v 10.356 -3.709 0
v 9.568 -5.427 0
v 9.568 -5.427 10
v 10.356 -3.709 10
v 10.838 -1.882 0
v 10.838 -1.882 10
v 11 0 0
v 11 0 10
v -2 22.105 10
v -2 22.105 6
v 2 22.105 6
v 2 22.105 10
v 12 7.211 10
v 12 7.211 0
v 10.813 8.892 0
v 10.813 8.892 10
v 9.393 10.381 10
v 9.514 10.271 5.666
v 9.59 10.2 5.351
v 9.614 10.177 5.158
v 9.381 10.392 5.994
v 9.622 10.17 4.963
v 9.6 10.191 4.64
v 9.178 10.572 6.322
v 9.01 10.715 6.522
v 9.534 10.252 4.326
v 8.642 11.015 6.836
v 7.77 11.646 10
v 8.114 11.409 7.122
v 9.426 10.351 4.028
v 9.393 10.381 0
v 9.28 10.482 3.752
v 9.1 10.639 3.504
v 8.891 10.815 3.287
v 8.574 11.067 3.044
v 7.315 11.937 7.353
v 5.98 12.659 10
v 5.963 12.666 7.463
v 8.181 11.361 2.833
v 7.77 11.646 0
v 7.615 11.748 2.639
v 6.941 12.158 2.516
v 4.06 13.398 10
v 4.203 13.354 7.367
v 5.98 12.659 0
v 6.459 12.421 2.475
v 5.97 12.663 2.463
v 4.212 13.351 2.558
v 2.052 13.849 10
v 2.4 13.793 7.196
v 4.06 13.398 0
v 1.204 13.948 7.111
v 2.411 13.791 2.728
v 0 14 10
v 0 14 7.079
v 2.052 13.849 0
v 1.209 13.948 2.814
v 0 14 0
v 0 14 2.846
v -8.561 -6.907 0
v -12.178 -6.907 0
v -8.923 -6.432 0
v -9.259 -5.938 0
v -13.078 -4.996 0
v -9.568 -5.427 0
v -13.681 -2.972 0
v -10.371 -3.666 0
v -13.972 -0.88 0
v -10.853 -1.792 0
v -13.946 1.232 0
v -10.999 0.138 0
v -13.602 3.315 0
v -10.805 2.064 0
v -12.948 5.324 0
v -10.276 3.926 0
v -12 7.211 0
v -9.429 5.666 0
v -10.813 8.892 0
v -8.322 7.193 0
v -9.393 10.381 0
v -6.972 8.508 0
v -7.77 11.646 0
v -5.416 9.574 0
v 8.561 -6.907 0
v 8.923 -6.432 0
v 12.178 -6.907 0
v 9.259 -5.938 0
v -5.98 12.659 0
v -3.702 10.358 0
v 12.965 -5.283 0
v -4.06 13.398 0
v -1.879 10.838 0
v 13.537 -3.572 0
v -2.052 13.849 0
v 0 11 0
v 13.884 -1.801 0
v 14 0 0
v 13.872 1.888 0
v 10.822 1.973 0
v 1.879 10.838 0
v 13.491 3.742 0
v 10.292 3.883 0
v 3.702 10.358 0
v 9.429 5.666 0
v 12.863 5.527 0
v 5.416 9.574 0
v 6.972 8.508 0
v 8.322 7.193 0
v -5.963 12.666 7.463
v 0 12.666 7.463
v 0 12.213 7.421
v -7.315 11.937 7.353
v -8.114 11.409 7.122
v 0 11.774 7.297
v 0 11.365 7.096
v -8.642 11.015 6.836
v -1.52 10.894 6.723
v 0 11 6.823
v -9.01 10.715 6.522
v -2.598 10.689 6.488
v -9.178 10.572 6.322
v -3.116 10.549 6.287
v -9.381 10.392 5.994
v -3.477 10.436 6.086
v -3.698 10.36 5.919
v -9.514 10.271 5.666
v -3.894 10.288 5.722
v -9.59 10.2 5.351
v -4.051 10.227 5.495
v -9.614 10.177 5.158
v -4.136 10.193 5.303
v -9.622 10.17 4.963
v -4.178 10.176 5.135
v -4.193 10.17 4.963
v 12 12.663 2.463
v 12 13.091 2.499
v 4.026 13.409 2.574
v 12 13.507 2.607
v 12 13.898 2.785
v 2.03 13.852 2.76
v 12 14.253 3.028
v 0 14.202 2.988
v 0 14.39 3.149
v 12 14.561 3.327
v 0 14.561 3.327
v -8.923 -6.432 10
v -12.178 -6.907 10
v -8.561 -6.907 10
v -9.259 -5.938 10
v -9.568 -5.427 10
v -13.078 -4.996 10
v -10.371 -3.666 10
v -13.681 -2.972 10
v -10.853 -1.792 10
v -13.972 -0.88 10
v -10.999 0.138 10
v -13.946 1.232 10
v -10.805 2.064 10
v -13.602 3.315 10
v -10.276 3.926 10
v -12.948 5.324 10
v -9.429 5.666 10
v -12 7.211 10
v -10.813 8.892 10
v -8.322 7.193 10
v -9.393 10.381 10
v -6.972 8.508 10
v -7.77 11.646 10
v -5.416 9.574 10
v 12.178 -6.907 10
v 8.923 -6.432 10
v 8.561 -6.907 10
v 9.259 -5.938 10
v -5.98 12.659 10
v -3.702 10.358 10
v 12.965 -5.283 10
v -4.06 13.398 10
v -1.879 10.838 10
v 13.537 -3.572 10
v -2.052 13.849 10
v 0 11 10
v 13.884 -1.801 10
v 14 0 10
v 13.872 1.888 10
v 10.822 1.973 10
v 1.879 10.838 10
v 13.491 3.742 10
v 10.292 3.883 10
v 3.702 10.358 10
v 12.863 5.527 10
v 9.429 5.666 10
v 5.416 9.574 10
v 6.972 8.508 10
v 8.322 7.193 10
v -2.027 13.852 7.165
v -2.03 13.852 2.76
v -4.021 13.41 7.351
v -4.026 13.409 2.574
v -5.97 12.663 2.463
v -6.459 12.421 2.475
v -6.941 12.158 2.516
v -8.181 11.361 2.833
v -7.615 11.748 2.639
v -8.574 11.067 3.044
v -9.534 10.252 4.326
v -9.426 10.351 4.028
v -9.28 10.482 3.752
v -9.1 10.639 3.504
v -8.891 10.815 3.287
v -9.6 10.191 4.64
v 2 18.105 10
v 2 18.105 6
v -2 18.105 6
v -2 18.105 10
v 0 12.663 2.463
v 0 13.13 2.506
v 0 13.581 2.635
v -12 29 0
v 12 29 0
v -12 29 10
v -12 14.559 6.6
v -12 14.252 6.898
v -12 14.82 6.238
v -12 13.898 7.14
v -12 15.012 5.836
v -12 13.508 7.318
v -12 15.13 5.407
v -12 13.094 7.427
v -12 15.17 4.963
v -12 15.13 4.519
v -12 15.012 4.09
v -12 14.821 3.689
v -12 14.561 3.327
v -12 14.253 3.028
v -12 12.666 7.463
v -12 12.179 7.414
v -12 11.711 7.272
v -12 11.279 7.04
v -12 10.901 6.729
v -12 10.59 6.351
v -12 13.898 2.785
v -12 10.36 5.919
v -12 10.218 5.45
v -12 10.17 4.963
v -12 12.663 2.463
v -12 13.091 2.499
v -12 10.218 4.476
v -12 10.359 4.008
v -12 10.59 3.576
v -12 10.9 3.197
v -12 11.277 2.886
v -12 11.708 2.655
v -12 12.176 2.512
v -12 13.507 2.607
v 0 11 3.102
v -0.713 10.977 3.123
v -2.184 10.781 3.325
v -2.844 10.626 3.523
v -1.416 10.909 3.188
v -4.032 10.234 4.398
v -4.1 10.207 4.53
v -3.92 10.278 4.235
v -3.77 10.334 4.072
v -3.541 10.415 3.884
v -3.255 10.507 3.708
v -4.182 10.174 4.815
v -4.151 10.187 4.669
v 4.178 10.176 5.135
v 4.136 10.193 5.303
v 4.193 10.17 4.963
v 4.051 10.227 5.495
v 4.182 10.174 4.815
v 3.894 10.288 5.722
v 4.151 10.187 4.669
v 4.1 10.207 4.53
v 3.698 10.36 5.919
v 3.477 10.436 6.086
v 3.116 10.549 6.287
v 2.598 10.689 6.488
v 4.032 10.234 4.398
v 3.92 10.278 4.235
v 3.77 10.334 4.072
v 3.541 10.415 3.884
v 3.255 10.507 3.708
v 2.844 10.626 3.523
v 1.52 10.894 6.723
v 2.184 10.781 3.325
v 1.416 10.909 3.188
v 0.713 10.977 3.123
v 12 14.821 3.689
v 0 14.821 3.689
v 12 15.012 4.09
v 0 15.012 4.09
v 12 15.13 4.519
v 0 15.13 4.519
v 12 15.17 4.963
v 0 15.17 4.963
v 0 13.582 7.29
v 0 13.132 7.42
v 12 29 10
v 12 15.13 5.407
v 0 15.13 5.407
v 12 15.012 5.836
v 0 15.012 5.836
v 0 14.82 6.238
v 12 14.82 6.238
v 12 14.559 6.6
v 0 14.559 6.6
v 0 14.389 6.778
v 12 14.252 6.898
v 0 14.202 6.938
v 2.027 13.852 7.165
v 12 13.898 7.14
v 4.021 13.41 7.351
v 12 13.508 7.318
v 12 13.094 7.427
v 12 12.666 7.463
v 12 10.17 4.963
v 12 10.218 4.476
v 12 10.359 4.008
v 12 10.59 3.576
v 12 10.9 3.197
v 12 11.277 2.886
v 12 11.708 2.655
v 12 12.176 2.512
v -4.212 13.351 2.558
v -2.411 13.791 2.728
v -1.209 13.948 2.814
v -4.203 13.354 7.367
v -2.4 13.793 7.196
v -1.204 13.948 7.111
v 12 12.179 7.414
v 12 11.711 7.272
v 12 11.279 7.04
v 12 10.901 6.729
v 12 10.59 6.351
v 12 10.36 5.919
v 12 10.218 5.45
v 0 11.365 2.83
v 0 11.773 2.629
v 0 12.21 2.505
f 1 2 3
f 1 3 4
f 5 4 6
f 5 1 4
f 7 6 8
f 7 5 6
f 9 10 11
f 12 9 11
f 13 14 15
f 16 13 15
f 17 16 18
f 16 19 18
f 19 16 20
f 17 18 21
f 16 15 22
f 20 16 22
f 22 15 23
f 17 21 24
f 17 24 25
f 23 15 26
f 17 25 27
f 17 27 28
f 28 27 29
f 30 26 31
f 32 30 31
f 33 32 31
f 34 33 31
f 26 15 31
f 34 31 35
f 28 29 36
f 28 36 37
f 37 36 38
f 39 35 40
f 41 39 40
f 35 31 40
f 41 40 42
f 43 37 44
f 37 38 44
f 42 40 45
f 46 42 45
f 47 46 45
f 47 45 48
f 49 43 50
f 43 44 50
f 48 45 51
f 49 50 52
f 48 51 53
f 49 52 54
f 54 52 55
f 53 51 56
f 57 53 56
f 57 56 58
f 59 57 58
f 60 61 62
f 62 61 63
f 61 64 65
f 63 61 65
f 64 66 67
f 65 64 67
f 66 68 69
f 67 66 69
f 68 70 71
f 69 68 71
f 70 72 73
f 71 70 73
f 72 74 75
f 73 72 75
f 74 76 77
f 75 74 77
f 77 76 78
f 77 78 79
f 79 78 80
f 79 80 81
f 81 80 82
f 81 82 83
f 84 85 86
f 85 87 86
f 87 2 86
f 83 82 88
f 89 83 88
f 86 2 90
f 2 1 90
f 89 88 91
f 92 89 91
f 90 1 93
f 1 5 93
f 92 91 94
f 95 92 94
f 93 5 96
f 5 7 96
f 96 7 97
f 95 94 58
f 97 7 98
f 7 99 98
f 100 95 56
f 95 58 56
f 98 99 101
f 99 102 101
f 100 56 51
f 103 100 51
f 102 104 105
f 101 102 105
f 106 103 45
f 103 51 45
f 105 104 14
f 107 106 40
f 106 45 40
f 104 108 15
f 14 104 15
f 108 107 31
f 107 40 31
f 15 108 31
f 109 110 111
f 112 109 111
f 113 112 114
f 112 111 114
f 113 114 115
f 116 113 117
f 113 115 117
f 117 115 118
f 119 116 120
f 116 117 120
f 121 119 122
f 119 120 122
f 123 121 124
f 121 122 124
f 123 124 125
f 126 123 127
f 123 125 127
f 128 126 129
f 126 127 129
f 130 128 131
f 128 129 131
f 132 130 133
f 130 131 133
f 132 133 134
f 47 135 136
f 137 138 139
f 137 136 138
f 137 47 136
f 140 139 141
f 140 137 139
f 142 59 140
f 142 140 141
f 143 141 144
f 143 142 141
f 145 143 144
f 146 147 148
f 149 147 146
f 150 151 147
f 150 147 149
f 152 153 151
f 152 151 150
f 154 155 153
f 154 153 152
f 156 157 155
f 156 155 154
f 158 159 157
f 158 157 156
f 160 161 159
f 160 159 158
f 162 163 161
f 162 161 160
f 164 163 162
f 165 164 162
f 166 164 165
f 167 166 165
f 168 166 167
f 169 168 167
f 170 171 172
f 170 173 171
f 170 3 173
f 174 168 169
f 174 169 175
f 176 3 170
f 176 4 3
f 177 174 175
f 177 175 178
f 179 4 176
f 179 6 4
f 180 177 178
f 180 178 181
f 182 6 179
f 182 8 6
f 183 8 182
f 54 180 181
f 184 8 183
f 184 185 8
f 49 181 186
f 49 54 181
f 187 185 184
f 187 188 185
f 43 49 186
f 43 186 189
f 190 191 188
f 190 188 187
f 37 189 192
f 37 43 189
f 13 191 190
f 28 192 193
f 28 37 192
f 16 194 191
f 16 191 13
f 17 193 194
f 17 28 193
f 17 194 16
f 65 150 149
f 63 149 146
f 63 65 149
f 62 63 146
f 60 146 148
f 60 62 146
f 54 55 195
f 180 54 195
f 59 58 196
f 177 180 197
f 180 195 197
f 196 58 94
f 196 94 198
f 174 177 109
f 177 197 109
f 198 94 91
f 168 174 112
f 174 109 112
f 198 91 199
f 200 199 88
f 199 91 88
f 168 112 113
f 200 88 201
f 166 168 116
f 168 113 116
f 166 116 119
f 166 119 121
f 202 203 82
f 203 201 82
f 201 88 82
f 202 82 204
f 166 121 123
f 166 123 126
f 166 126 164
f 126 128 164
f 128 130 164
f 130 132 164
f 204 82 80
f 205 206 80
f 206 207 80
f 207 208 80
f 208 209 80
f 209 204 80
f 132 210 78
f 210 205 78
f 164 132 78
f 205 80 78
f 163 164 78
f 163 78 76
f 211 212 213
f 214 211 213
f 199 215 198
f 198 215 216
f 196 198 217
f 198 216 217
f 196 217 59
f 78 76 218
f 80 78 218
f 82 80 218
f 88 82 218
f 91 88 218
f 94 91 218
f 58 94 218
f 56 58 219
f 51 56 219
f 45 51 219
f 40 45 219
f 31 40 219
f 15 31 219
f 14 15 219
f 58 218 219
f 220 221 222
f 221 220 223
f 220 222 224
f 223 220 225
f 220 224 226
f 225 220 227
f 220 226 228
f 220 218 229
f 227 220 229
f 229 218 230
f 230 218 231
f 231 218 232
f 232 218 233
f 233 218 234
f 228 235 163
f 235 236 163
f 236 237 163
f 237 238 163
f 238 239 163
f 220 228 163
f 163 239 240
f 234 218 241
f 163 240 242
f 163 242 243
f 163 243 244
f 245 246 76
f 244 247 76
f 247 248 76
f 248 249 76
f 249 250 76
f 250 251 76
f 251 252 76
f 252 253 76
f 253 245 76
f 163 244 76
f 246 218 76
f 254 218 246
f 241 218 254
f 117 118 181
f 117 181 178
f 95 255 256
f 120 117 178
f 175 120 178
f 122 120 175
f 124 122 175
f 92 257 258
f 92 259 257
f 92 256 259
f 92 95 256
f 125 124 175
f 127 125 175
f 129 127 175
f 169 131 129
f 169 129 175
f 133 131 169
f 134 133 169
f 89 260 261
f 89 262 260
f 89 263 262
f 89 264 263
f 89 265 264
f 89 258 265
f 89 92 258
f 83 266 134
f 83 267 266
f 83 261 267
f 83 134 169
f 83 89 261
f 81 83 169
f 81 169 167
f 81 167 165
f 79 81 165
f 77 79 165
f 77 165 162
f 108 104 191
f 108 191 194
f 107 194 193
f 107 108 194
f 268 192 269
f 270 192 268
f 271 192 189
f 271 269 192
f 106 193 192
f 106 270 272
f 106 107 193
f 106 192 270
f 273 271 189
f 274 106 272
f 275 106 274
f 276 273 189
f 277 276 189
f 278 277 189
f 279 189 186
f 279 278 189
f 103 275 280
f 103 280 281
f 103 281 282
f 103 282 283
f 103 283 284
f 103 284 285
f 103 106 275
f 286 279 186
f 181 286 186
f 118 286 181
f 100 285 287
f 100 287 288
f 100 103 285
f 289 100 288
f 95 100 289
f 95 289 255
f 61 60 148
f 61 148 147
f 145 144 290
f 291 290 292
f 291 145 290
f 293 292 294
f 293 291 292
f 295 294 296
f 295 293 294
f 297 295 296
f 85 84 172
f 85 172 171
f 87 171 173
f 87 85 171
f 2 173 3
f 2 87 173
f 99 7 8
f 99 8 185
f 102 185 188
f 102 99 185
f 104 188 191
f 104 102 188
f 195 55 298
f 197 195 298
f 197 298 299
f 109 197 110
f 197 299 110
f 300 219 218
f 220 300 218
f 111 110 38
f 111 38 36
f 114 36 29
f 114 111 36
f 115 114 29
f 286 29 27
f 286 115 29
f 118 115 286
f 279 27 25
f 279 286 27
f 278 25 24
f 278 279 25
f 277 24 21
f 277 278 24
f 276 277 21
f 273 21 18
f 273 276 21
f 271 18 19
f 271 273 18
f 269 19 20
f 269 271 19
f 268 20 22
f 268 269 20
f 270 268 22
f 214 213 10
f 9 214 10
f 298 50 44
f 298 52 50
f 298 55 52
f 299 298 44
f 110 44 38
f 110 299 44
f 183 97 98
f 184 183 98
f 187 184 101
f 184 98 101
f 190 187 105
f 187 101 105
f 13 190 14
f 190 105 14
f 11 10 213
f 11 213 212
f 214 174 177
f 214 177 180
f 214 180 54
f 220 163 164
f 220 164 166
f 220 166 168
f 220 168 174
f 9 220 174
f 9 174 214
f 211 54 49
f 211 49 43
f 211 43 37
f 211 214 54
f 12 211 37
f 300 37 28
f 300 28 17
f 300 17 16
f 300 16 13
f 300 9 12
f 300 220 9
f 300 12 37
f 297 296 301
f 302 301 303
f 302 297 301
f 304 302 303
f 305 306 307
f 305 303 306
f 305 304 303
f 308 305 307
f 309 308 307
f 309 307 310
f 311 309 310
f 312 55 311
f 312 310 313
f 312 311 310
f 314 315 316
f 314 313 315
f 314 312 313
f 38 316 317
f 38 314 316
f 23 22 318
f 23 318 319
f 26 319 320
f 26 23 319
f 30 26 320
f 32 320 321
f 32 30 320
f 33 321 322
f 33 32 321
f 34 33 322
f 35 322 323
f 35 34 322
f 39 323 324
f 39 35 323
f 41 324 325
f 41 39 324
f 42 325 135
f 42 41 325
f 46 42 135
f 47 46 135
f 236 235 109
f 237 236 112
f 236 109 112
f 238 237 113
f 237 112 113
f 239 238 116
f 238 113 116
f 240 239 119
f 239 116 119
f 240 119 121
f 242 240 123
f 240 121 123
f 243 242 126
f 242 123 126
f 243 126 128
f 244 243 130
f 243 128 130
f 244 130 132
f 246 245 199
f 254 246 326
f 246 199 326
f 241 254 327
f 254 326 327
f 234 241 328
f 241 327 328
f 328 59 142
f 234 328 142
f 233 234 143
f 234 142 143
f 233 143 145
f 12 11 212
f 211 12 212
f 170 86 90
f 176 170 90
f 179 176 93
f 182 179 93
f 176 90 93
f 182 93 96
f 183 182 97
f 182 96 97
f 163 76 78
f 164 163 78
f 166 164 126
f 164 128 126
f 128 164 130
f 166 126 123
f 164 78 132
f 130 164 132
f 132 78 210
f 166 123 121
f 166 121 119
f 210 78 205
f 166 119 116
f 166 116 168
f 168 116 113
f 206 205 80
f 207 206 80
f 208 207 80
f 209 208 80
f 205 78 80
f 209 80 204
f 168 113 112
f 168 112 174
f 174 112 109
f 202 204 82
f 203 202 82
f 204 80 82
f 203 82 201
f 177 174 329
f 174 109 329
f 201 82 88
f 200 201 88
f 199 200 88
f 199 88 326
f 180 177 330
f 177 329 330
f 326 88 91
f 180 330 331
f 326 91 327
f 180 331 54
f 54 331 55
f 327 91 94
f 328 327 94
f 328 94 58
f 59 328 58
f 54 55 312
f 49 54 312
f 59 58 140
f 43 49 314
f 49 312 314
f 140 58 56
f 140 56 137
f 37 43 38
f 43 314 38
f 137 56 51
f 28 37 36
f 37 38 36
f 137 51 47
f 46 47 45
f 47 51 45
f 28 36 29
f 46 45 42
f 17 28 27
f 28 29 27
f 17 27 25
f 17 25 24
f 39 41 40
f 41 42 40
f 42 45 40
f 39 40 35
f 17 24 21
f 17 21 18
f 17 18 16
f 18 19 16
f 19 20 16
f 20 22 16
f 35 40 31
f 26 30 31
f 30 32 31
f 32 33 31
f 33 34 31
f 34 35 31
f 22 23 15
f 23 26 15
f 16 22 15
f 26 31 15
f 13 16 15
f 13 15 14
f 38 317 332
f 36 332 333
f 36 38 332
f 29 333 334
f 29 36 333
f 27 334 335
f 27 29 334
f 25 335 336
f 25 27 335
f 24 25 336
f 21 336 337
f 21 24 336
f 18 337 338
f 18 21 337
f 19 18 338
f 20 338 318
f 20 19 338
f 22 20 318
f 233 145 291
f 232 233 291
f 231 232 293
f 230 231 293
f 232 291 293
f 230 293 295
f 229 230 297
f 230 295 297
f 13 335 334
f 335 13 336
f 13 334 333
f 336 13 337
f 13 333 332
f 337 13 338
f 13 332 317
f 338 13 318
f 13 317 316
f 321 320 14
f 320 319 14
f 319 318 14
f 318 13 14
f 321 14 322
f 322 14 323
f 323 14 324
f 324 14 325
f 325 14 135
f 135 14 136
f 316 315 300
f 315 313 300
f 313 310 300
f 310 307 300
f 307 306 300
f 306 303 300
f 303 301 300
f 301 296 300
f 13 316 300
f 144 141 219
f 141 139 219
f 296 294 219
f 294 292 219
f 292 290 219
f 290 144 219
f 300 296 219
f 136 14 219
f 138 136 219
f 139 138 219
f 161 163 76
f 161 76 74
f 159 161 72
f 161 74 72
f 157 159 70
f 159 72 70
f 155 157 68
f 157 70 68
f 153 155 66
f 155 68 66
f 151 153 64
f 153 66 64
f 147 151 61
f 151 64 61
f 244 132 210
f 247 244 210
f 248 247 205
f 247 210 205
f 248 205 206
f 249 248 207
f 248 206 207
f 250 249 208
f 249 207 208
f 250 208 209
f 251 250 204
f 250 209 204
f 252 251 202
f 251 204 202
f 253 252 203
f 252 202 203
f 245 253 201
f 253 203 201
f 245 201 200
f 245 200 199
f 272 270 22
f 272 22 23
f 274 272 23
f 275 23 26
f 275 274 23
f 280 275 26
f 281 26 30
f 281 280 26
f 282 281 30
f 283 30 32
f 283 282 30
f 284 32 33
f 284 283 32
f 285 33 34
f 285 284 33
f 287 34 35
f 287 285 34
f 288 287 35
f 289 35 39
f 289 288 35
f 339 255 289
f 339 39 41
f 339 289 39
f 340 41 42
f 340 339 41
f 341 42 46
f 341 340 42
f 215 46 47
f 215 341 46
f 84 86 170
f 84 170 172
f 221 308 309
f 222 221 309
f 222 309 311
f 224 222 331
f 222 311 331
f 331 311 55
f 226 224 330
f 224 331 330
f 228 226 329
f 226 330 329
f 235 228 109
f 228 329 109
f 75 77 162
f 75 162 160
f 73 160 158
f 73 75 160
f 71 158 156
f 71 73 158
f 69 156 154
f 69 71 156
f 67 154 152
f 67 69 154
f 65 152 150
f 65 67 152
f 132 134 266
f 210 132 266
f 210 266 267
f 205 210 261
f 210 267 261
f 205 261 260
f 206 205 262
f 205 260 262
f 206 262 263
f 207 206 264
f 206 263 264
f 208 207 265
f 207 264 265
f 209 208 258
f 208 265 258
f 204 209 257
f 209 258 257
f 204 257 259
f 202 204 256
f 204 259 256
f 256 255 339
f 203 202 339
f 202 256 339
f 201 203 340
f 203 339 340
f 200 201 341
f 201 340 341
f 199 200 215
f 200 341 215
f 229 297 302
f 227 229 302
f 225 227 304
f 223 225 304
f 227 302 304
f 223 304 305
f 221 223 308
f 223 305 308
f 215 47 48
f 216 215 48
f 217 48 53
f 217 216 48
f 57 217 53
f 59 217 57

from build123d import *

# Parameters (mm, degrees)
F1_DEPTH      = 10
F2_DEPTH      = 10
F3_T          = -3
F4_DEPTH      = 10
F6_DEPTH      = 25
F6_DEPTH_BACK = 25
F0_W          = 2
F0_H          = 4
F7_DEPTH      = 6


# Not quite as in the source:
# - a feature names something its author has since deleted; it is built from what else it names


with BuildPart() as f1:
    # F0 (on Top) → F1 (new body)
    with BuildSketch(Plane.XY):
        with BuildLine():
            ThreePointArc((12.177598341, -6.9069601595), (13.5367347757, -3.5716679035), (14, 0))
            ThreePointArc((14, 0), (13.4907375632, 3.7416573868), (12, 7.2111025509))
            Line((12, 7.2111025509), (-12, 7.2111025509))
            ThreePointArc((-12, 7.2111025509), (-13.9988924226, 0.1760992369), (-12.177598341, -6.9069601595))
            Line((-12.177598341, -6.9069601595), (12.177598341, -6.9069601595))
        make_face()
        with BuildLine():
            ThreePointArc((-12.177598341, -6.9069601595), (0, -14), (12.177598341, -6.9069601595))
            Line((12.177598341, -6.9069601595), (-12.177598341, -6.9069601595))
        make_face()
        with BuildLine():
            Line((-12, 7.2111025509), (12, 7.2111025509))
            ThreePointArc((12, 7.2111025509), (6.8936407031, 12.1851433252), (0, 14))
            ThreePointArc((0, 14), (-6.8936407031, 12.1851433252), (-12, 7.2111025509))
        make_face()
    extrude(amount=F1_DEPTH)

    # F3
    f3_openings = [f1.faces().sort_by_distance(p)[0] for p in [
        (0, 0, 0),
        (0, 0, 10),
    ]]
    offset(amount=F3_T, openings=f3_openings)

    # F0 (on Top) → F4 (cut)
    with BuildSketch(Plane.XY):
        with BuildLine():
            Line((15.9751549363, -6.9069601595), (12.177598341, -6.9069601595))
            ThreePointArc((12.177598341, -6.9069601595), (0, -14), (-12.177598341, -6.9069601595))
            Line((-12.177598341, -6.9069601595), (-18.203439191, -6.9069601595))
            Line((-18.203439191, -6.9069601595), (-18.203439191, -17.6538378))
            Line((-18.203439191, -17.6538378), (15.9751549363, -17.6538378))
            Line((15.9751549363, -17.6538378), (15.9751549363, -6.9069601595))
        make_face()
        with BuildLine():
            ThreePointArc((-12.177598341, -6.9069601595), (0, -14), (12.177598341, -6.9069601595))
            Line((12.177598341, -6.9069601595), (-12.177598341, -6.9069601595))
        make_face()
    extrude(amount=F4_DEPTH, mode=Mode.SUBTRACT)


with BuildPart() as f2:
    # F0 (on Top) → F2 (new body)
    with BuildSketch(Plane.XY):
        with BuildLine():
            ThreePointArc((-12, 7.2111025509), (-6.8936407031, 12.1851433252), (0, 14))
            Line((0, 14), (0, 18.105))
            Line((0, 18.105), (-2, 18.105))
            Line((-2, 18.105), (-2, 22.105))
            Line((-2, 22.105), (0, 22.105))
            Line((0, 22.105), (0, 29))
            Line((0, 29), (-12, 29))
            Line((-12, 29), (-12, 7.2111025509))
        make_face()
        with BuildLine():
            ThreePointArc((0, 14), (6.8936407031, 12.1851433252), (12, 7.2111025509))
            Line((12, 7.2111025509), (12, 29))
            Line((12, 29), (0, 29))
            Line((0, 29), (0, 22.105))
            Line((0, 22.105), (2, 22.105))
            Line((2, 22.105), (2, 18.105))
            Line((2, 18.105), (0, 18.105))
            Line((0, 18.105), (0, 14))
        make_face()
    extrude(amount=F2_DEPTH)


with BuildPart() as f6_tool:
    # F5 (on Right) → F6 (new body, two sides)
    with BuildSketch(Plane.YZ) as f6_sk:
        with BuildLine():
            ThreePointArc((14.5591712674, 6.5997470737), (13.7068573789, 7.2374578628), (12.6664981618, 7.4627725634))
            Line((12.6664981618, 7.4627725634), (14.5591712674, 6.5997470737))
        make_face()
        with BuildLine():
            ThreePointArc((12.6664981618, 7.4627725634), (10.9007638693, 6.7294296355), (10.1696419809, 4.9627745402))
            Line((10.1696419809, 4.9627745402), (15.1696419809, 4.9627745402))
            ThreePointArc((15.1696419809, 4.9627745402), (15.0120577442, 5.8363238473), (14.5591712674, 6.5997470737))
            Line((14.5591712674, 6.5997470737), (12.6664981618, 7.4627725634))
        make_face()
        with BuildLine():
            ThreePointArc((10.1696419809, 4.9627745402), (10.8995849446, 3.1973006411), (12.6631604515, 2.4627829422))
            Line((12.6631604515, 2.4627829422), (14.5606008683, 3.3274536278))
            ThreePointArc((14.5606008683, 3.3274536278), (15.0124391572, 4.0902486719), (15.1696419809, 4.9627745402))
            Line((15.1696419809, 4.9627745402), (10.1696419809, 4.9627745402))
        make_face()
        with BuildLine():
            Line((14.5606008683, 3.3274536278), (12.6631604515, 2.4627829422))
            ThreePointArc((12.6631604515, 2.4627829422), (13.7063326661, 2.6878520309), (14.5606008683, 3.3274536278))
        make_face()
    extrude(amount=-F6_DEPTH)
    extrude(f6_sk.sketch, amount=F6_DEPTH_BACK)


with BuildPart() as f1_1:
    add(f1.part)

    # F6: cut by f6_tool
    add(f6_tool.part, mode=Mode.SUBTRACT)


with BuildPart() as f2_1:
    add(f2.part)

    # F6: cut by f6_tool
    add(f6_tool.part, mode=Mode.SUBTRACT)

    # F0 (on Top) → F7 (join)
    with BuildSketch(Plane.XY):
        with Locations((1, 20.105)):
            Rectangle(F0_W, F0_H)
        with Locations((-1, 20.105)):
            Rectangle(F0_W, F0_H)
    extrude(amount=F7_DEPTH)


solid = Compound([f1_1.part, f2_1.part])
